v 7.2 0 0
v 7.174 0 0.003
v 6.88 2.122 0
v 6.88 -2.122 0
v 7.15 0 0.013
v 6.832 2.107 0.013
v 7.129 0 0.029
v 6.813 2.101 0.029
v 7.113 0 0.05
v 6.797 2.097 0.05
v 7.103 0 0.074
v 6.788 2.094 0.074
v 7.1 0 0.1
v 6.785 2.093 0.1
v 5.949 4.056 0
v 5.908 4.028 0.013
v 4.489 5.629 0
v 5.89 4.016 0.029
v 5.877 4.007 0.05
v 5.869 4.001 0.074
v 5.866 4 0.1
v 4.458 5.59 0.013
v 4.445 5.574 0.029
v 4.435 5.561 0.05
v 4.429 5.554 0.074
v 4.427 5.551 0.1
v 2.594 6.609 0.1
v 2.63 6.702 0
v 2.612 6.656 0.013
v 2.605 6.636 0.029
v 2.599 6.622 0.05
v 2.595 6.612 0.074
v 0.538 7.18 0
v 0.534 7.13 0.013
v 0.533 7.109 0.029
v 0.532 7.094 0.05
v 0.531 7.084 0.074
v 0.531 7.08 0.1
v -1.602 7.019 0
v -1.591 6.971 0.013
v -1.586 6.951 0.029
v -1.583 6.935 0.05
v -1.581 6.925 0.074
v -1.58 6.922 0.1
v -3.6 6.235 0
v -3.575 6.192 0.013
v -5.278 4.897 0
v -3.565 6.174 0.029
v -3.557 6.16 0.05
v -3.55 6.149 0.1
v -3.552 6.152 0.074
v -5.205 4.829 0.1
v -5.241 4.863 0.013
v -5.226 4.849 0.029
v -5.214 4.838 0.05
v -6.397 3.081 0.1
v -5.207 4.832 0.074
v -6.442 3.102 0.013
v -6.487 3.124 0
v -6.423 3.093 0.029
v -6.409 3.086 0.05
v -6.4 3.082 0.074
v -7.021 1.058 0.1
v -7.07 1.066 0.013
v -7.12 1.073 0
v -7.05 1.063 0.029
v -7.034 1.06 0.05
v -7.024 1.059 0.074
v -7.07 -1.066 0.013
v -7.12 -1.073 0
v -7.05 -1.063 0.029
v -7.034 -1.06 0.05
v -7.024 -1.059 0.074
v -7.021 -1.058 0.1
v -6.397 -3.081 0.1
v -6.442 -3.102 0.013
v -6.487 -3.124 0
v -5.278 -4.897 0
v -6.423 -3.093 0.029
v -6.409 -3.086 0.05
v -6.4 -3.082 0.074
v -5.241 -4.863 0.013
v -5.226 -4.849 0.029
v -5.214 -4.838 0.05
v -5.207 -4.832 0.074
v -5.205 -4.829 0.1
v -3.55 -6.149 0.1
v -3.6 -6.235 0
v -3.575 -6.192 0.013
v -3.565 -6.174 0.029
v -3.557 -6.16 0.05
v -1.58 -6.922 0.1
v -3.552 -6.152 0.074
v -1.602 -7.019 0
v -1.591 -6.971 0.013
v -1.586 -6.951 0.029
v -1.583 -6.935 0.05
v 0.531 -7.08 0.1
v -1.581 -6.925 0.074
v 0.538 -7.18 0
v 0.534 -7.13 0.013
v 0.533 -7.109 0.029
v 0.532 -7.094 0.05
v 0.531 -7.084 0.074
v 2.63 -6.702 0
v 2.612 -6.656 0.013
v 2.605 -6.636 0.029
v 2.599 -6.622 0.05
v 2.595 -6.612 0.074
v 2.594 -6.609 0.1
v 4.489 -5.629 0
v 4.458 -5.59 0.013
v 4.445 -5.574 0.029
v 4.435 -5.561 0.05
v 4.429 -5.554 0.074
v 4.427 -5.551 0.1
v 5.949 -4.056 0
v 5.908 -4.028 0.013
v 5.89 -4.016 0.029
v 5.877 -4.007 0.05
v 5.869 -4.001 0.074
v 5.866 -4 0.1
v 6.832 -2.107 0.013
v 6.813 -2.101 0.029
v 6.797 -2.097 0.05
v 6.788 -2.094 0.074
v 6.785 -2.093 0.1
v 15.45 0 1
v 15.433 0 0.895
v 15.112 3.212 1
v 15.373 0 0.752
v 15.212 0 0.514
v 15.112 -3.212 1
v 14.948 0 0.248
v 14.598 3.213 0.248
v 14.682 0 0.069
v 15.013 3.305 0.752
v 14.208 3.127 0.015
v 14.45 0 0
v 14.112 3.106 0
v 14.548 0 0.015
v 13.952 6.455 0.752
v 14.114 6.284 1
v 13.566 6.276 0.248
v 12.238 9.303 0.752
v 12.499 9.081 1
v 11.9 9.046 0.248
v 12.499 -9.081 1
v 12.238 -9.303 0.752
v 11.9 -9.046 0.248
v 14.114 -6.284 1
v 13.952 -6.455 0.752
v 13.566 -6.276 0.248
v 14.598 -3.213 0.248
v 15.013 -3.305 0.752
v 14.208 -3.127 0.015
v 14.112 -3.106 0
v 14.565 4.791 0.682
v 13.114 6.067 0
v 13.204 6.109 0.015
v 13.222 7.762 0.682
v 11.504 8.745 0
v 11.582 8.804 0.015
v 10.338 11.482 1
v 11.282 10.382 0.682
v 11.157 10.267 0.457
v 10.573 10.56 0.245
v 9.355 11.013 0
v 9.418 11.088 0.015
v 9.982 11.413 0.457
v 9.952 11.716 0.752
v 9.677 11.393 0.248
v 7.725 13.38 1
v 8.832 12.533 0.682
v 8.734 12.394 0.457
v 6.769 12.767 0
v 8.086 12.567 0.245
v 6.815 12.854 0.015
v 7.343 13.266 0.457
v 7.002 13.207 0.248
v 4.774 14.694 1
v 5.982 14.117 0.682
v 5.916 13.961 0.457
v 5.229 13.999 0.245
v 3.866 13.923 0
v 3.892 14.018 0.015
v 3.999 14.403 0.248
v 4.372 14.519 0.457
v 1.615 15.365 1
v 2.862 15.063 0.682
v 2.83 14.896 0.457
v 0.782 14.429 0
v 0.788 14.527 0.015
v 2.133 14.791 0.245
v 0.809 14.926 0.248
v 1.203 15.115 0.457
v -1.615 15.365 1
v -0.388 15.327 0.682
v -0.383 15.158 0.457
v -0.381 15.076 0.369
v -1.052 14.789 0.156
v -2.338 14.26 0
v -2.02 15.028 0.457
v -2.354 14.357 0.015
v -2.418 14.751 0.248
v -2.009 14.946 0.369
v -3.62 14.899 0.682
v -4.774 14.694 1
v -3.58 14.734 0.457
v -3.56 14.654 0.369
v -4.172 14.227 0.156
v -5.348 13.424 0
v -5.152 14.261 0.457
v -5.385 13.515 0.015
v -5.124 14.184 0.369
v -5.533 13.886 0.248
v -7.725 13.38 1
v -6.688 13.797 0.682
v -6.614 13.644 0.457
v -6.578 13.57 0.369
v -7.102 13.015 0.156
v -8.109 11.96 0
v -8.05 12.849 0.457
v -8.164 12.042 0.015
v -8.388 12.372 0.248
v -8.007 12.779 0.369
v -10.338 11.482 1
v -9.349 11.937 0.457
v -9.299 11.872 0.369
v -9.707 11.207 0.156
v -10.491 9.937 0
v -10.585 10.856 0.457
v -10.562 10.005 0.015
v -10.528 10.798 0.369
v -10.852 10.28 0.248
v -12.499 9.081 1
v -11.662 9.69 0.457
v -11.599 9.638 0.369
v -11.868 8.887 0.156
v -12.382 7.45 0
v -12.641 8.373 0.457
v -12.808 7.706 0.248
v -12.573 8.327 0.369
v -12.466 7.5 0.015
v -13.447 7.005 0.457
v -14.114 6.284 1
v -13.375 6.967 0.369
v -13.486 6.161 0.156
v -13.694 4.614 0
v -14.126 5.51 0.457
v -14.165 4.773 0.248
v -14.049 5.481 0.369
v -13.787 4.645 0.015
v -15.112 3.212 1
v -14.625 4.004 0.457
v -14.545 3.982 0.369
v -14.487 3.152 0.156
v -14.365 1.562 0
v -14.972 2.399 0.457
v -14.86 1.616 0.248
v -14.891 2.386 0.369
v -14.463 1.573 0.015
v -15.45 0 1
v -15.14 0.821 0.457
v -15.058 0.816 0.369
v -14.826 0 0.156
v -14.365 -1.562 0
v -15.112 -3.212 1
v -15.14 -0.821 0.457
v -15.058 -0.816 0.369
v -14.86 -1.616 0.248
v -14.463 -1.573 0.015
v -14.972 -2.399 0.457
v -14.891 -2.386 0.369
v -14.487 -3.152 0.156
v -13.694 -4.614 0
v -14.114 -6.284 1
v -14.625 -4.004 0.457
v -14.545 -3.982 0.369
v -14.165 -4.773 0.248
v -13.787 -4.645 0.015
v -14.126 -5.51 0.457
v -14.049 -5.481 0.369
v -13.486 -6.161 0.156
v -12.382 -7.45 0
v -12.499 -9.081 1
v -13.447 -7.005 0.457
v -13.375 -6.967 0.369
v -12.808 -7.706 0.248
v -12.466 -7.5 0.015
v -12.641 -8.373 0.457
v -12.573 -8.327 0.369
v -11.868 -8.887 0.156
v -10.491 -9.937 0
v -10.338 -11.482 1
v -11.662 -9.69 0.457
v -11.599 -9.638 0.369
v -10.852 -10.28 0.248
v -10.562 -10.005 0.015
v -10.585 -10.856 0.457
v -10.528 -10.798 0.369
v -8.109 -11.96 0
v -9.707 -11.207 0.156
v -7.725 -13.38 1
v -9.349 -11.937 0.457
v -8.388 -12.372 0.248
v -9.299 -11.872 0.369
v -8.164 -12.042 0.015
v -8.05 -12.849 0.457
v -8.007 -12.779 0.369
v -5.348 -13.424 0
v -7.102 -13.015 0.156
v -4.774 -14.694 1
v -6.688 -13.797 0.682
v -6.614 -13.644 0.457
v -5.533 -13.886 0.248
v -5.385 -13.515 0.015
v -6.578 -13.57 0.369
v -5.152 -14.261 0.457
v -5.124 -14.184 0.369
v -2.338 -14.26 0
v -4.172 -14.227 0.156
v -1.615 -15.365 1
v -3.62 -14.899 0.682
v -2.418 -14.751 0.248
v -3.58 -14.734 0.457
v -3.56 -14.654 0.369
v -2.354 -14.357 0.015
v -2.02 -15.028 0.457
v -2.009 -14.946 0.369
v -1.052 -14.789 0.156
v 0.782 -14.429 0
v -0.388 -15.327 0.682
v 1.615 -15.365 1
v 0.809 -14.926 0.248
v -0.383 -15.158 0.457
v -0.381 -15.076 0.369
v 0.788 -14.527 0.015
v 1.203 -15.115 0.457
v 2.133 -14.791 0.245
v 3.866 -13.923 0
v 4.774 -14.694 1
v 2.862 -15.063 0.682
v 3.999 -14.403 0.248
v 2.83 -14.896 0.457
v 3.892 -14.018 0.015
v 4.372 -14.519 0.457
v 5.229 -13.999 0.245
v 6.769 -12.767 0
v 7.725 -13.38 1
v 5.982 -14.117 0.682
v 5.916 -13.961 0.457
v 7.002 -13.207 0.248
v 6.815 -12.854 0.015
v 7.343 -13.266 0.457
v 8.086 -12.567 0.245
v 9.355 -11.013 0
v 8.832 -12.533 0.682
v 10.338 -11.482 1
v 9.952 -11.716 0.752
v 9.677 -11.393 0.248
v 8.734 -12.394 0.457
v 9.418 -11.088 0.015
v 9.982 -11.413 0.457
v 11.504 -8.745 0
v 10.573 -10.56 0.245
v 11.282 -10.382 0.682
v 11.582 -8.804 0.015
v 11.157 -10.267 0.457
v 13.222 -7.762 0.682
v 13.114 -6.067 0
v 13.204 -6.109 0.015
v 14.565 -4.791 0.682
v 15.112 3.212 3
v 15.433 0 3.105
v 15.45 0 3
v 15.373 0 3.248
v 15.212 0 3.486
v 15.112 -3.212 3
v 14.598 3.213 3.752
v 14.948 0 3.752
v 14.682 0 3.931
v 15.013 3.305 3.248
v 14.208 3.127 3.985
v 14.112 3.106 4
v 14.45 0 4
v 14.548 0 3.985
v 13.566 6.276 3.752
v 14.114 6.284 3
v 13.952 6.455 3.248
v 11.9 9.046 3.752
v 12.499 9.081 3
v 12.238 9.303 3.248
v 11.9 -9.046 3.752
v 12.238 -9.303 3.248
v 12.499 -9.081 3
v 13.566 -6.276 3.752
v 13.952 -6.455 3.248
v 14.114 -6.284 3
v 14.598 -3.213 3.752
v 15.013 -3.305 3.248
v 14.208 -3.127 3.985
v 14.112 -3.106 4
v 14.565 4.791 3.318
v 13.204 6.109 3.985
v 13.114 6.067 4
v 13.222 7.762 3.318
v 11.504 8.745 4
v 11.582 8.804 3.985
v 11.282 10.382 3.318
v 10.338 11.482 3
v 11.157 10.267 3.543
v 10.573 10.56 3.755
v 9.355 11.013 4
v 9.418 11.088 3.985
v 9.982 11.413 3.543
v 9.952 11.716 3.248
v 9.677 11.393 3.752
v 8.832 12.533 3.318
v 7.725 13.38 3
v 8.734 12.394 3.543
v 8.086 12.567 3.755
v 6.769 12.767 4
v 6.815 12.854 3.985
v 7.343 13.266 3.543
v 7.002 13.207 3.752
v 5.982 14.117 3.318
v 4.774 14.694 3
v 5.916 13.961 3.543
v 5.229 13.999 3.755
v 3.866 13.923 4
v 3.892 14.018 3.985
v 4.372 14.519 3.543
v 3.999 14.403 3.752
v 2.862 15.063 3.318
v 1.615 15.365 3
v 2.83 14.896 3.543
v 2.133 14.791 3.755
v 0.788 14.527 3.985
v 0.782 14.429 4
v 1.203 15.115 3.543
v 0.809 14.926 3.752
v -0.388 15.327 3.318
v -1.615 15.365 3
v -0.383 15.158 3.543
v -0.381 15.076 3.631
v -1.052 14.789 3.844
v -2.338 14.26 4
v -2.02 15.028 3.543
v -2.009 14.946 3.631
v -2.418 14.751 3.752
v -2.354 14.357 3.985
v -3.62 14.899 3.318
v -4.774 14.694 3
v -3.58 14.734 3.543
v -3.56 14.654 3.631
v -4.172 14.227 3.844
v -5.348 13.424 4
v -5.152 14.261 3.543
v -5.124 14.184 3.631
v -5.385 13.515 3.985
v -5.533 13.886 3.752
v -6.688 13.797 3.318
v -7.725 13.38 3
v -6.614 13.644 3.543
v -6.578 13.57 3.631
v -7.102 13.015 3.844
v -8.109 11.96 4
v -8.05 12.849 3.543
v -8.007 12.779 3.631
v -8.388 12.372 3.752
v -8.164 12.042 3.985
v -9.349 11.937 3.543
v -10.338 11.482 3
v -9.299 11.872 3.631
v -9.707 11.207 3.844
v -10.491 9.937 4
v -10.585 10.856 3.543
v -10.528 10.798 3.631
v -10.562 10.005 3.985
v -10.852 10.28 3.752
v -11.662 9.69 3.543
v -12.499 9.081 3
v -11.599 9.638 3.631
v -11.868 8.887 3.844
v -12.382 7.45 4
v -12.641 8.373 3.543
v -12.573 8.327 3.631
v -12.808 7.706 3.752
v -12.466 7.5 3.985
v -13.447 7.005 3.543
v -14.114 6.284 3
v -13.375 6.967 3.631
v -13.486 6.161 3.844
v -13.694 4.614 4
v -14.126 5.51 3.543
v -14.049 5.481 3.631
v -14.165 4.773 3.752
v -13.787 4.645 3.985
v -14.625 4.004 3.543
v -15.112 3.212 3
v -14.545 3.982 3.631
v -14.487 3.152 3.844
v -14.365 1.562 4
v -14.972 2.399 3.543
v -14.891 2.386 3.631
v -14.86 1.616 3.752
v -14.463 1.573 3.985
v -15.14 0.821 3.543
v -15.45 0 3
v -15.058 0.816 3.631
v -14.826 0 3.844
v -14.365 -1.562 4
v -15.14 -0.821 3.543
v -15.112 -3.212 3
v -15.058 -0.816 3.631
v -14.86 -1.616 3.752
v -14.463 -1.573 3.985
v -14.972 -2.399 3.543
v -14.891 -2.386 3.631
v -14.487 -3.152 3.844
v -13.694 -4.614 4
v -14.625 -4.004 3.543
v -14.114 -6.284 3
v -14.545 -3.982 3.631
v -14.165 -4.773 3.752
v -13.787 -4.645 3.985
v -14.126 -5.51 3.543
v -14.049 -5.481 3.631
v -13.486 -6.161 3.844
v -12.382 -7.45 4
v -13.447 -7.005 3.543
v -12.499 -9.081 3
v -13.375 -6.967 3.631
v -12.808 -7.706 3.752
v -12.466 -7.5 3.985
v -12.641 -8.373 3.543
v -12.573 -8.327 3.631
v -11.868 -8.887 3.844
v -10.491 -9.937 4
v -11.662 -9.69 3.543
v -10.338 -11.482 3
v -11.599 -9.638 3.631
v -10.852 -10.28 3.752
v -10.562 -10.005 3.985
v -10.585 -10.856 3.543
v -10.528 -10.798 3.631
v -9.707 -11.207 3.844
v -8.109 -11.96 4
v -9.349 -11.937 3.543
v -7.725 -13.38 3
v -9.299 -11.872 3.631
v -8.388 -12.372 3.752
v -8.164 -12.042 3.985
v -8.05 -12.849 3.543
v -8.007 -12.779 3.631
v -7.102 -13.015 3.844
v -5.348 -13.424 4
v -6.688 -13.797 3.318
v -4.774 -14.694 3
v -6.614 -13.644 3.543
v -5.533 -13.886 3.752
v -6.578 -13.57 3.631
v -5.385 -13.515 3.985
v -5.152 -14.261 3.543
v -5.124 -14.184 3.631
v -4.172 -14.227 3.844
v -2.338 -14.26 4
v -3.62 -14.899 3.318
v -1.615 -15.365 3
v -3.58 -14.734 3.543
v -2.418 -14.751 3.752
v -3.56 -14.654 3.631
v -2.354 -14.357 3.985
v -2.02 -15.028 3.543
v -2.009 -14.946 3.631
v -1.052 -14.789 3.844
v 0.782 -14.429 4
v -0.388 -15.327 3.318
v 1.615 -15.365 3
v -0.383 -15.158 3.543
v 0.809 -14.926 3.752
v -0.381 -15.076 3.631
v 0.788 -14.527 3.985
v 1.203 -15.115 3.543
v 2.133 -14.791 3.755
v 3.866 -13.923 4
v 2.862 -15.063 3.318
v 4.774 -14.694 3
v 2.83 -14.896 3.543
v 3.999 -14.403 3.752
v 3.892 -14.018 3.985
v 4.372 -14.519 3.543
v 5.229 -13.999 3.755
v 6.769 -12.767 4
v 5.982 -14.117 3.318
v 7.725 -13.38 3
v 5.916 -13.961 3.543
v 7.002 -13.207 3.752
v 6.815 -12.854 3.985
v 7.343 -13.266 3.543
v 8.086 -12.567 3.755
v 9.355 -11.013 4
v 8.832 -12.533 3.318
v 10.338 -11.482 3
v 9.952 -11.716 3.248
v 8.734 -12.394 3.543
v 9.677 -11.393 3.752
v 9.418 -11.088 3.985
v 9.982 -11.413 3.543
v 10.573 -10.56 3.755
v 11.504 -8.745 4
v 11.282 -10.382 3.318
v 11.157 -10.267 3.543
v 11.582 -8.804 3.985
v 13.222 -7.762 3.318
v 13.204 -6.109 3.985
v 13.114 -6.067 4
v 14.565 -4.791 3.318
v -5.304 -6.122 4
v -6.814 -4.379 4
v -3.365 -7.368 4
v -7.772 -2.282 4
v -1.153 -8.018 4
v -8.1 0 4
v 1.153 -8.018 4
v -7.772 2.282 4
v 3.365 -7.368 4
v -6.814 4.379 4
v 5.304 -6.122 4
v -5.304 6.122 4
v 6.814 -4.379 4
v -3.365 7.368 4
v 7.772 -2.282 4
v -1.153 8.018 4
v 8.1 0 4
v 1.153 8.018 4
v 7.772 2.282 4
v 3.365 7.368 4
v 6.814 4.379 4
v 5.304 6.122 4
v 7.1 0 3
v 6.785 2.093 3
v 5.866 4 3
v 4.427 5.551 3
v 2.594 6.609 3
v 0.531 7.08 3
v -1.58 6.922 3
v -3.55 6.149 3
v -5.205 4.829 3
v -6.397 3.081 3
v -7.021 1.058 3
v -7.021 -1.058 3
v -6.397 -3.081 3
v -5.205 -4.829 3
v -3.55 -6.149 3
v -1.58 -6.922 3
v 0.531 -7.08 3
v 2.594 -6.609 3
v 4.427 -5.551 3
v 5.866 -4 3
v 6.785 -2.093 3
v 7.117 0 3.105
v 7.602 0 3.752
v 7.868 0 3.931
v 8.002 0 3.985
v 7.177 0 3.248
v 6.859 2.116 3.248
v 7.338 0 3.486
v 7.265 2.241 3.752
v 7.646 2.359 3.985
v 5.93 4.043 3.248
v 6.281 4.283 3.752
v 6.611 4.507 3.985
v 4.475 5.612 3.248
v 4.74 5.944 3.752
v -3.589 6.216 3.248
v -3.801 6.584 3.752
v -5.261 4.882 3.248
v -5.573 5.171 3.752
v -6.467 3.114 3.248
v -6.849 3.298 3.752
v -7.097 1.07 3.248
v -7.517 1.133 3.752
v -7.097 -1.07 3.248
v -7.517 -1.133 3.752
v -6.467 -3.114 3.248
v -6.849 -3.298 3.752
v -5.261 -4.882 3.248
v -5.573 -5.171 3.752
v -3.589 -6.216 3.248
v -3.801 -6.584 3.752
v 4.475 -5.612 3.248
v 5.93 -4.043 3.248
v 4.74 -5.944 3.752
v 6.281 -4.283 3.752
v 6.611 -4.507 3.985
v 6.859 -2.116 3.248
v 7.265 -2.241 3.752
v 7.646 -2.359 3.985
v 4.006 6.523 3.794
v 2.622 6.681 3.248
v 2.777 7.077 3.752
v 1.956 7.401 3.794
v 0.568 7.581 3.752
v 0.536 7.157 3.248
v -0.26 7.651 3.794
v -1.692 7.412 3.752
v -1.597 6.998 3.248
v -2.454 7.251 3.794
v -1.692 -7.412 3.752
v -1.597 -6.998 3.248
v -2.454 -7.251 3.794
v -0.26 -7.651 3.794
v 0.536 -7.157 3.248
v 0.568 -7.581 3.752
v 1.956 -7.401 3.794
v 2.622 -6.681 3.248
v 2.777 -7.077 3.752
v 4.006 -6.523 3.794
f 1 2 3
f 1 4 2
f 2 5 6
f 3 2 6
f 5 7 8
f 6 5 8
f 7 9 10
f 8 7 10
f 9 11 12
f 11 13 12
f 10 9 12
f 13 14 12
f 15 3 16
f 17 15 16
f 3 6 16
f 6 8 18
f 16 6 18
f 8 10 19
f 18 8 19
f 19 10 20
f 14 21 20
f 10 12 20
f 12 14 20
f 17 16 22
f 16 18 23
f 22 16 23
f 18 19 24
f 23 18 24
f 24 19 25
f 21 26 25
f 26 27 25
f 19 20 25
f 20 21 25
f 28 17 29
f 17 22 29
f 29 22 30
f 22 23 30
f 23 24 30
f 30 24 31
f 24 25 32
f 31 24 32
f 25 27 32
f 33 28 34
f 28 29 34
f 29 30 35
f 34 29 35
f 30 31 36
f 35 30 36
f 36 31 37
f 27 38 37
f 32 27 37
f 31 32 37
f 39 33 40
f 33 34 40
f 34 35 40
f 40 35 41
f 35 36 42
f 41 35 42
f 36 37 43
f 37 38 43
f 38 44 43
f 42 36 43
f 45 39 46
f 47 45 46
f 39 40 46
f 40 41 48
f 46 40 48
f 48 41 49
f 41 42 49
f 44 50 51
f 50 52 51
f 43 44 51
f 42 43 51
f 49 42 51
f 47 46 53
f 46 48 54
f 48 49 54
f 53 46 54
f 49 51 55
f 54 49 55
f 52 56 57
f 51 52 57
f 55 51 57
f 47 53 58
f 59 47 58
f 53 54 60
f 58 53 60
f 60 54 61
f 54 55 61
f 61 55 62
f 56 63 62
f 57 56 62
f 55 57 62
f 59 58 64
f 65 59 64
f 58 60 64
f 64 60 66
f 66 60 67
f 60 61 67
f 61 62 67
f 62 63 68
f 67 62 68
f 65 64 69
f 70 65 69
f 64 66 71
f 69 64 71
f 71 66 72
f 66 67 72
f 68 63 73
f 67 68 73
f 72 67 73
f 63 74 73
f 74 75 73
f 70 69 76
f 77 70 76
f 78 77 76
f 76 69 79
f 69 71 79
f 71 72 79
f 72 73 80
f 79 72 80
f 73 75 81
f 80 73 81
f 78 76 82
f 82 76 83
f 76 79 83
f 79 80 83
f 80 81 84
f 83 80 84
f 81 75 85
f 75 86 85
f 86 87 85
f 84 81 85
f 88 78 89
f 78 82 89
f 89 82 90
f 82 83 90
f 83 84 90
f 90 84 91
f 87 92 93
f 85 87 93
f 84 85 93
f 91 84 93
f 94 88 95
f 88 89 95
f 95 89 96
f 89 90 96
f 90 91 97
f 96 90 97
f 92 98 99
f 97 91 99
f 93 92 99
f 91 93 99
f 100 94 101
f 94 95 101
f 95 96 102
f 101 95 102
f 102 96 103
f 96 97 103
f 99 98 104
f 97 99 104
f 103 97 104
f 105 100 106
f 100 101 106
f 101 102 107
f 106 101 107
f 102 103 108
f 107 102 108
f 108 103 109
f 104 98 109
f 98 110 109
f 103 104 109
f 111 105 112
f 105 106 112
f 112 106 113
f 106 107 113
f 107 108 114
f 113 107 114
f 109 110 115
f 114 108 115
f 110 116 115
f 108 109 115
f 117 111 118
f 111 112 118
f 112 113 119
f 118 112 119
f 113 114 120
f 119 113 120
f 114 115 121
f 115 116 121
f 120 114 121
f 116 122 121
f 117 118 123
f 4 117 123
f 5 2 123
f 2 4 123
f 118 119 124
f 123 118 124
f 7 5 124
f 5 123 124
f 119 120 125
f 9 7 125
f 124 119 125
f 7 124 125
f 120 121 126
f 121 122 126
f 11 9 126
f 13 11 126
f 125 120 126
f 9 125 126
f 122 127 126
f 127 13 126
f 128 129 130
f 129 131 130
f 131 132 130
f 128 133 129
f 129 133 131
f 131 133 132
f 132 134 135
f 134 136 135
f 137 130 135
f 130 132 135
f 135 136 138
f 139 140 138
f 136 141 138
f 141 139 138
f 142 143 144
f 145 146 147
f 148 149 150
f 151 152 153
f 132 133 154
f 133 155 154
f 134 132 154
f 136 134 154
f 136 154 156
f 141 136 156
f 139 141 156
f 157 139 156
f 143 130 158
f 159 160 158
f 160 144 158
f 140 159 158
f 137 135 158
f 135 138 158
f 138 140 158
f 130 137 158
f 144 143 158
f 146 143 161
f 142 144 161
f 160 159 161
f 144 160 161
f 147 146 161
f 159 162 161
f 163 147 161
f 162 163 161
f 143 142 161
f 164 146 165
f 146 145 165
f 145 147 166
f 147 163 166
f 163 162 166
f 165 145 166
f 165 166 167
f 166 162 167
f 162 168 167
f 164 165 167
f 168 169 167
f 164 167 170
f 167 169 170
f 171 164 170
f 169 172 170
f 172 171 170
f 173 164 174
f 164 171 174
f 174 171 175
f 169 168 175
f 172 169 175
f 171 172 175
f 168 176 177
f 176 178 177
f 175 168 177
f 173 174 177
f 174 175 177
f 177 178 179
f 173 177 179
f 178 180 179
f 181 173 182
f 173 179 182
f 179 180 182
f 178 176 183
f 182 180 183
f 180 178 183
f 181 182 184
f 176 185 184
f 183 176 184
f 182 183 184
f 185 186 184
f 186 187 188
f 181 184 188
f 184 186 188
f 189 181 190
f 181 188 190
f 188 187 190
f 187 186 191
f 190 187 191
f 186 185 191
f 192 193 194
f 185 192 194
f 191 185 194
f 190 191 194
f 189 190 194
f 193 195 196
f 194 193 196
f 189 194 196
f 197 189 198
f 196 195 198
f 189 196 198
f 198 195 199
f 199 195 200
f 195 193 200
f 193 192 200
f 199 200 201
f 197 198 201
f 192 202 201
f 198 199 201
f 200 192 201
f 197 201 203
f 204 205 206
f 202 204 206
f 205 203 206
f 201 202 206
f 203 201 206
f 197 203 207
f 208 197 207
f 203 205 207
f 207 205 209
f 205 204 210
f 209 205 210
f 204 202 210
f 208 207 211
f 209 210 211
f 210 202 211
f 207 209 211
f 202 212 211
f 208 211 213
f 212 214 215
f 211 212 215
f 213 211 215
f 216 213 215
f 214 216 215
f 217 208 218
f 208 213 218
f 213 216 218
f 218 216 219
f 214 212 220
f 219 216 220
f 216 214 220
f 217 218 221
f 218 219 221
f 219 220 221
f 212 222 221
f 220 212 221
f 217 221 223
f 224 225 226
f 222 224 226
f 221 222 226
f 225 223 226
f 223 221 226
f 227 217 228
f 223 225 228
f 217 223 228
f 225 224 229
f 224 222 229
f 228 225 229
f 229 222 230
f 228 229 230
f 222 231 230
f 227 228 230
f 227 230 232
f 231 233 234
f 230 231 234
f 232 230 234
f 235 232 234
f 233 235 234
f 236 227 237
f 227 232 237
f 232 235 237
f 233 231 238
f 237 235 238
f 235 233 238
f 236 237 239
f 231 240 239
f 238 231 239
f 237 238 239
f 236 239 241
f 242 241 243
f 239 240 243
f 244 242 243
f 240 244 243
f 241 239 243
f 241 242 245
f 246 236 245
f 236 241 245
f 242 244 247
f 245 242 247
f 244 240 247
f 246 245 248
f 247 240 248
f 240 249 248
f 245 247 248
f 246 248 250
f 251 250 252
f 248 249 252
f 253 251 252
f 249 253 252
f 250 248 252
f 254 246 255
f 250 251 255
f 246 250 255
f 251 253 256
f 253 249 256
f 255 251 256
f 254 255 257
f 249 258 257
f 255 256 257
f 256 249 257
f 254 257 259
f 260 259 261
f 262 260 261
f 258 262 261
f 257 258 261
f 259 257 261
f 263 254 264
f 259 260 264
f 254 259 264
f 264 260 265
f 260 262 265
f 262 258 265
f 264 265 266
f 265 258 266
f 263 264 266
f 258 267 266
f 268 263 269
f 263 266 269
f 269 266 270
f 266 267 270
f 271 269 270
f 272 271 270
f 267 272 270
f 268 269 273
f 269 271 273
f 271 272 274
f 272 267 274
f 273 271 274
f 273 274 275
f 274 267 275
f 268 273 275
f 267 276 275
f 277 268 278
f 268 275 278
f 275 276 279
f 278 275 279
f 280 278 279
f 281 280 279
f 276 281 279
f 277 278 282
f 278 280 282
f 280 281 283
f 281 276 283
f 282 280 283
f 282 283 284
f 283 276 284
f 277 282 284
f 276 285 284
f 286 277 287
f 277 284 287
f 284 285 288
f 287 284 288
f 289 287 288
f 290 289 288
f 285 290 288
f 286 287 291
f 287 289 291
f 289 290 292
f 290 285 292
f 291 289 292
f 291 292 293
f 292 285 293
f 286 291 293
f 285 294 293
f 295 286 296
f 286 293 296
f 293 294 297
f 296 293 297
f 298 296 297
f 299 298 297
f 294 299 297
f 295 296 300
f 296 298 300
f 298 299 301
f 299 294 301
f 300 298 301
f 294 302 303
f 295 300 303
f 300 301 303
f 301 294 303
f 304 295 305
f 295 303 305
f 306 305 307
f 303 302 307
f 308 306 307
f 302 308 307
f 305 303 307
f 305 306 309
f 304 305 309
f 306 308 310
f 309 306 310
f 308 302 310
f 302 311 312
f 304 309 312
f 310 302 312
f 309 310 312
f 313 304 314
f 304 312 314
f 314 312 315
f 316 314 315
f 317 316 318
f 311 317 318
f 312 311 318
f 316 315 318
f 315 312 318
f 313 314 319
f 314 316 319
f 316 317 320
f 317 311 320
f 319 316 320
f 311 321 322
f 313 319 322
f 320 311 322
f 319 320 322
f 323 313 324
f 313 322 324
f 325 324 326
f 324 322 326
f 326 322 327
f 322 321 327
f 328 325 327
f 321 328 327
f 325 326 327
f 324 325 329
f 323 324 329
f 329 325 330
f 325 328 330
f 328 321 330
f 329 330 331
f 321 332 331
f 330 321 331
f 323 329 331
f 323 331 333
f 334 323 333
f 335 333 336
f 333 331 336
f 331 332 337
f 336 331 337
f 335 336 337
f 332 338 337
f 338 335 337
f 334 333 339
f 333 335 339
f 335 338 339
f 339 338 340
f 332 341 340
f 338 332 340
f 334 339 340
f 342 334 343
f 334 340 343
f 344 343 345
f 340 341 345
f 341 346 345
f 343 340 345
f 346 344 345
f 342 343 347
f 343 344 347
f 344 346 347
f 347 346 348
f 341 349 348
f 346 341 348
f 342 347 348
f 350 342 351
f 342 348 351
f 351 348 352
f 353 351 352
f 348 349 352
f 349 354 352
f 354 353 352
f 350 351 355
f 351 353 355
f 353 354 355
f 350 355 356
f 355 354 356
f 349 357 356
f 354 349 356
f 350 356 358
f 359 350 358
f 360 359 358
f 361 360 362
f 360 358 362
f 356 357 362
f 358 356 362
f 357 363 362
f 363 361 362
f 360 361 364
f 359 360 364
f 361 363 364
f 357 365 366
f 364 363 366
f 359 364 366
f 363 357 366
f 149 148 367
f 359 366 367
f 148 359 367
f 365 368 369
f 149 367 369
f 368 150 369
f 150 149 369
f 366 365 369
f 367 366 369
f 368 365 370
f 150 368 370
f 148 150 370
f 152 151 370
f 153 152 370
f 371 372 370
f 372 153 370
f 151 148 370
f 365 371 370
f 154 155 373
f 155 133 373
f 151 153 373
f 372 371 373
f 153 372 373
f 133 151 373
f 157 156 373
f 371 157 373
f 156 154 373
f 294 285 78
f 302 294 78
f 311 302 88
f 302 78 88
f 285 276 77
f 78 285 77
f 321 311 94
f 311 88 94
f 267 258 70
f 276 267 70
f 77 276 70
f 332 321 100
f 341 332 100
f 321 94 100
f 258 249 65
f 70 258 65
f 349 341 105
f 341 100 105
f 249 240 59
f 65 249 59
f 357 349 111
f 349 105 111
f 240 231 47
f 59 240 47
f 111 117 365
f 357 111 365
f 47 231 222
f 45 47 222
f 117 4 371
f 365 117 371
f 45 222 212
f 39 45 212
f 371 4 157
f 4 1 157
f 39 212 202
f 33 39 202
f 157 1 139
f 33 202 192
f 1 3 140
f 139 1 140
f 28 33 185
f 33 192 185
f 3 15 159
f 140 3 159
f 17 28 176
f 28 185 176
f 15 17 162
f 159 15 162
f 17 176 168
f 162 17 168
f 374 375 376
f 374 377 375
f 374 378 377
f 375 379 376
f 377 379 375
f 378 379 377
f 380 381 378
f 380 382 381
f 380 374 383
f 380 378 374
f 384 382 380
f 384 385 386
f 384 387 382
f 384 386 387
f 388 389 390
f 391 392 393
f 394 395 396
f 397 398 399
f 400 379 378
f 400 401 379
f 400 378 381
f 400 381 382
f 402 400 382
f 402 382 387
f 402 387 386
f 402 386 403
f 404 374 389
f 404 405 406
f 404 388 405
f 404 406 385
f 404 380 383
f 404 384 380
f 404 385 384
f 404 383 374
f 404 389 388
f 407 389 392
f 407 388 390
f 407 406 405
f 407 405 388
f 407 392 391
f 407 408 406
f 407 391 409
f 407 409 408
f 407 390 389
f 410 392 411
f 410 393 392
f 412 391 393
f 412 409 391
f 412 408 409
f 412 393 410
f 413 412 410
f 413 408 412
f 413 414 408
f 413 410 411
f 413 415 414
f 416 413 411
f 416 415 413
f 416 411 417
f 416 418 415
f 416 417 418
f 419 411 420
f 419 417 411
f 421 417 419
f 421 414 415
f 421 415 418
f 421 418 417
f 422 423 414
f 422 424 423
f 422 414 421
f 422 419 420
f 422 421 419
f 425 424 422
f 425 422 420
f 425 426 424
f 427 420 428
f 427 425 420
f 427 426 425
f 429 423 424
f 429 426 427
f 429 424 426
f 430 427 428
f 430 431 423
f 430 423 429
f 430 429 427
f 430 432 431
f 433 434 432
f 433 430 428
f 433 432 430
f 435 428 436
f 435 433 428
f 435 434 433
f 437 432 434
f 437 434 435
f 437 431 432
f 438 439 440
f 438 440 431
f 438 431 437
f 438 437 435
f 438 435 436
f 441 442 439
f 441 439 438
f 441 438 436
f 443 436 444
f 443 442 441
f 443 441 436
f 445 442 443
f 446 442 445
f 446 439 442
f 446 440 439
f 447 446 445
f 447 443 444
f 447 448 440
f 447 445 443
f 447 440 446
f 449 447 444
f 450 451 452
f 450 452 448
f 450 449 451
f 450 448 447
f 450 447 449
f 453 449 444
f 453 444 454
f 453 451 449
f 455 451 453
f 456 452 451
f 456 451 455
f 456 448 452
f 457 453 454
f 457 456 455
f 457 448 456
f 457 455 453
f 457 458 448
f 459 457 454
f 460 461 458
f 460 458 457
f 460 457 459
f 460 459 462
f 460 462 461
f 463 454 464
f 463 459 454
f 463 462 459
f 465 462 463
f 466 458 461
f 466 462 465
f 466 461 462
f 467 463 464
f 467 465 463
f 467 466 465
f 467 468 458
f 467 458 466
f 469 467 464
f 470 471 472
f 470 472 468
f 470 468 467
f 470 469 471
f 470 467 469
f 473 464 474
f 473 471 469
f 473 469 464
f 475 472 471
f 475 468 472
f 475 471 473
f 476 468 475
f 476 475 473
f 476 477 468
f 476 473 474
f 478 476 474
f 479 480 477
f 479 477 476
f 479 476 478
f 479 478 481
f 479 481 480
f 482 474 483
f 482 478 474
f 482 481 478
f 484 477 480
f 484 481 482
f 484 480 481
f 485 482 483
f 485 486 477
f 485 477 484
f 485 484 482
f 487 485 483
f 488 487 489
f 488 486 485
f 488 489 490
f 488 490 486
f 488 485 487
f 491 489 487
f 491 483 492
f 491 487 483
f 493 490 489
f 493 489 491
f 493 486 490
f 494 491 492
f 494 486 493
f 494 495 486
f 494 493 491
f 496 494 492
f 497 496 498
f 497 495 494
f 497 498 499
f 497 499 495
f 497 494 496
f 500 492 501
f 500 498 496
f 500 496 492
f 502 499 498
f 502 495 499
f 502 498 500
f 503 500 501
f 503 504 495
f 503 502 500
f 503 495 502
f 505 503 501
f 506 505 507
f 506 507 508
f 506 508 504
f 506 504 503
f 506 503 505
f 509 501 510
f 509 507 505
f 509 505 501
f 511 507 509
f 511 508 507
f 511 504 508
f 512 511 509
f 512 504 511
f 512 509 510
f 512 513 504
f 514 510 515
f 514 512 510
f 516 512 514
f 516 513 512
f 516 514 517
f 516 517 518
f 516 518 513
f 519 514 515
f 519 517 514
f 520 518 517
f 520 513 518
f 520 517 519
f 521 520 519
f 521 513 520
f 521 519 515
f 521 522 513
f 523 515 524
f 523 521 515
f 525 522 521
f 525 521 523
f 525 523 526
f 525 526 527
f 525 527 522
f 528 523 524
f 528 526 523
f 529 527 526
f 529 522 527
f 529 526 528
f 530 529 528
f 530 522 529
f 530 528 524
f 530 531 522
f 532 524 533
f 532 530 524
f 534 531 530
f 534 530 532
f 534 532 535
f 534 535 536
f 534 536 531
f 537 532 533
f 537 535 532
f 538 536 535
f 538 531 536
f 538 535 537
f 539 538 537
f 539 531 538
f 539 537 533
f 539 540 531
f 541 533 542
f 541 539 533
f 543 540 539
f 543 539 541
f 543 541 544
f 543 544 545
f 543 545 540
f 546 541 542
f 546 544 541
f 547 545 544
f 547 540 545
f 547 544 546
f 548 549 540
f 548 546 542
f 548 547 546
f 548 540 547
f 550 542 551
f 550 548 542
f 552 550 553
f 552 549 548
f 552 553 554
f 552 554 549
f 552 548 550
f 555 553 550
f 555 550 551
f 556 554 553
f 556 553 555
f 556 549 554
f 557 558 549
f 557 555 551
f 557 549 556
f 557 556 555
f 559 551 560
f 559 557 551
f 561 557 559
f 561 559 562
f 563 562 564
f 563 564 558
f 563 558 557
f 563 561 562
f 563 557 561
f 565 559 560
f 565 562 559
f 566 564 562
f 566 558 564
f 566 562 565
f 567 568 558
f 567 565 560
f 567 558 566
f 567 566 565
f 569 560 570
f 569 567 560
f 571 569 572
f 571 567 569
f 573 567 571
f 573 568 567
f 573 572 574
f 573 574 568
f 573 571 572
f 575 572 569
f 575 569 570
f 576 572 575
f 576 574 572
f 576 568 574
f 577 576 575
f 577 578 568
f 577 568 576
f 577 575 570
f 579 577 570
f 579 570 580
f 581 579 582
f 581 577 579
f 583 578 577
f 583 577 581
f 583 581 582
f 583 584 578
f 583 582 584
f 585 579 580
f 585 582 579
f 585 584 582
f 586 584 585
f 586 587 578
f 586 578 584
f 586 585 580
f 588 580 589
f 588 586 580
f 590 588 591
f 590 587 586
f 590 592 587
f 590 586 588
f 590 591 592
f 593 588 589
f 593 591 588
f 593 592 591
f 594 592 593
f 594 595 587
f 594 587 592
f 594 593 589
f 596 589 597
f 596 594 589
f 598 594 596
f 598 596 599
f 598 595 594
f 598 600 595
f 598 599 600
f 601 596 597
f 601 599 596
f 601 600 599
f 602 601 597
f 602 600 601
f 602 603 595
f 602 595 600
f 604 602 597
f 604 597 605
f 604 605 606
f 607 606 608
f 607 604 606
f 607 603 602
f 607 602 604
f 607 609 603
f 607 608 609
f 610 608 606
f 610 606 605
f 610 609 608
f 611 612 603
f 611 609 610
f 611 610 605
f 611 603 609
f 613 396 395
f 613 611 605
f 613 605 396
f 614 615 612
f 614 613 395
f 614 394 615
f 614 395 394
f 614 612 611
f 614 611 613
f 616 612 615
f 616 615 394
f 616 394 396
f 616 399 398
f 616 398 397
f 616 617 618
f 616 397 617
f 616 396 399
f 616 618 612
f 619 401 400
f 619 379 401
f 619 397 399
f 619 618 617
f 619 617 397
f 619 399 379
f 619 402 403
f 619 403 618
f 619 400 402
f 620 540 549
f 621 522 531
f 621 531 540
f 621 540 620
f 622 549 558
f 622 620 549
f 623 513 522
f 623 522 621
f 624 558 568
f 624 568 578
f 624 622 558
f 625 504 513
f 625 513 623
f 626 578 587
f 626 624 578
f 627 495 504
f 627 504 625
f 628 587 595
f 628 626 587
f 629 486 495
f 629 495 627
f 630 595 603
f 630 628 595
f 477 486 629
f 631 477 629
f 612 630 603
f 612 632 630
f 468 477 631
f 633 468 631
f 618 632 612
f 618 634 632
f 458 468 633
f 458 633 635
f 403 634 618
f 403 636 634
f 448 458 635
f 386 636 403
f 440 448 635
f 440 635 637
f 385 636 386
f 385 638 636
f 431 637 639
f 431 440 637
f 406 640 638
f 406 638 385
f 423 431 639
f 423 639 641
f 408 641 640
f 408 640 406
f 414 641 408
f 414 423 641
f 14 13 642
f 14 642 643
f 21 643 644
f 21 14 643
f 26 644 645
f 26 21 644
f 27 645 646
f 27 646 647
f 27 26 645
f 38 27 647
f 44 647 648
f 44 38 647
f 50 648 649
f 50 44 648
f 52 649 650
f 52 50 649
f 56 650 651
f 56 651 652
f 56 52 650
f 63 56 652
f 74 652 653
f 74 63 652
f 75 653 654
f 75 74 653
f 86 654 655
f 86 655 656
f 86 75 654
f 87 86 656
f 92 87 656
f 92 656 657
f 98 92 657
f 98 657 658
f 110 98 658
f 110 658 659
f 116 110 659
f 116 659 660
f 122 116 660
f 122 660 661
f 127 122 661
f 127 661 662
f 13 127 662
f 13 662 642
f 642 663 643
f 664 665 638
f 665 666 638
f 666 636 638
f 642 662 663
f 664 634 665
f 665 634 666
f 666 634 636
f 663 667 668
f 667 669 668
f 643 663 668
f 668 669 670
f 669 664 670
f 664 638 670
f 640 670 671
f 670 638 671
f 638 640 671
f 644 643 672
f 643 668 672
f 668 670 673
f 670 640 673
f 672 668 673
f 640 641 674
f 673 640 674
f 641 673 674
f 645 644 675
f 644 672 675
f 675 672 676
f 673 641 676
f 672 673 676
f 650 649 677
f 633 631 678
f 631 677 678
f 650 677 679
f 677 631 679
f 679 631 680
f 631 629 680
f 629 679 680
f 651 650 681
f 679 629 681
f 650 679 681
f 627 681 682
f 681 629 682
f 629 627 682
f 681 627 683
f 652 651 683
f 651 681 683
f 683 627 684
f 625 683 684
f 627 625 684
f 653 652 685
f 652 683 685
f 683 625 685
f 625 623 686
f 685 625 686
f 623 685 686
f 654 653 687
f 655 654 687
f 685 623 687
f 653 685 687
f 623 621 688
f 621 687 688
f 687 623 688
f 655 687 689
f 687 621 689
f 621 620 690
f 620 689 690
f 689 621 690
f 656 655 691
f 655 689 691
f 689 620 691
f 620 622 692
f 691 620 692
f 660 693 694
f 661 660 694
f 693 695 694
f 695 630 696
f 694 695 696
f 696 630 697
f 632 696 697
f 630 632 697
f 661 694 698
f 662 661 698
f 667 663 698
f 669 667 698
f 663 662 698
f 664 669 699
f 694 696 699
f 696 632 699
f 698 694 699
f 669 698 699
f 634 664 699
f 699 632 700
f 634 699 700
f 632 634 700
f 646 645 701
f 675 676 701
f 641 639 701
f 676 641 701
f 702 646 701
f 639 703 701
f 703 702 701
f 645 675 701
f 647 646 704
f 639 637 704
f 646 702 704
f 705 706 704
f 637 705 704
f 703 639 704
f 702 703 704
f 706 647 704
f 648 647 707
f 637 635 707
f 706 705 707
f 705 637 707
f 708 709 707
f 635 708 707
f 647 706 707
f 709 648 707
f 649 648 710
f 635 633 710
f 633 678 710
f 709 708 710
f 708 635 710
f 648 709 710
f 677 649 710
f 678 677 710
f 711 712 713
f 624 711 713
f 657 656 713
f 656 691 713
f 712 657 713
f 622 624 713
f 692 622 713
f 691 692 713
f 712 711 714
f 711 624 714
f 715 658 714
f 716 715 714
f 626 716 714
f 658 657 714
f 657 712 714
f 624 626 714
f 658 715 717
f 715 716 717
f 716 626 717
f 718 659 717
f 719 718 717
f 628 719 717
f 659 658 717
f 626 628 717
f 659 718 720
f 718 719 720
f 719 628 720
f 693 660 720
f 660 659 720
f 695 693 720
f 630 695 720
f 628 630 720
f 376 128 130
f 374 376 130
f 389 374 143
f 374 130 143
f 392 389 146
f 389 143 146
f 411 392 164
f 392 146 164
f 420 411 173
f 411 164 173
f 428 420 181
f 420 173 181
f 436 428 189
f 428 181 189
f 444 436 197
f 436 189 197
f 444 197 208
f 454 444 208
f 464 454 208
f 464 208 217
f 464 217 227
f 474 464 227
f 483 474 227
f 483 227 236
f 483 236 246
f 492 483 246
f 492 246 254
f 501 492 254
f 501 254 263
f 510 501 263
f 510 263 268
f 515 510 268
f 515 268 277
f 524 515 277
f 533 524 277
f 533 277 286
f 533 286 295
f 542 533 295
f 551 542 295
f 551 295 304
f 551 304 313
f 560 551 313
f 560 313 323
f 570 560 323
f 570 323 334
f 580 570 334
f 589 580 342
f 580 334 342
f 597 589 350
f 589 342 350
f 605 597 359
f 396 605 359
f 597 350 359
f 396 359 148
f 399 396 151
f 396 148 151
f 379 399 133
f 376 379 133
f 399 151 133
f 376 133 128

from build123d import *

# Parameters (mm, degrees)
CROQUIS2_R              = 15.45
CROQUIS2_R_2            = 7.1
SALIENTE_EXTRUIR1_DEPTH = 4
REDONDEO1_SIZE          = 1
REDONDEO2_R             = 0.1


with BuildPart() as part:
    # Croquis2 → Saliente-Extruir1 (new body)
    with BuildSketch(Plane(origin=(0, 0, 0), x_dir=(0, 1, 0), z_dir=(0, 0, 1))):
        with Locations(Location((0, 0, 0), (0, 0, 270))):
            Circle(CROQUIS2_R)
        with Locations(Location((0, 0, 0), (0, 0, 270))):
            Circle(CROQUIS2_R_2, mode=Mode.SUBTRACT)
    extrude(amount=SALIENTE_EXTRUIR1_DEPTH)

    # Redondeo1
    # a fillet whose section is not a circle: 1 mm, written as the material it takes off along each edge
    with BuildSketch(Plane(origin=(0, 0, 0), x_dir=(1, 0, 0), z_dir=(0, -1, 0))) as redondeo1_piece_1:
        with BuildLine():
            Bezier((15.45, REDONDEO1_SIZE), (15.45, 0), (15.45 - REDONDEO1_SIZE, 0), weights=[1, 0.353553391, 1])
            Line((15.45 - REDONDEO1_SIZE, 0), (15.45, 0))
            Line((15.45, 0), (15.45, REDONDEO1_SIZE))
        make_face()
    revolve(axis=Axis((0, 0, 0), (0, 0, 1)), mode=Mode.SUBTRACT)
    with BuildSketch(Plane(origin=(0, 0, 4), x_dir=(1, 0, 0), z_dir=(0, -1, 0))) as redondeo1_piece_2:
        with BuildLine():
            Bezier((15.45, -REDONDEO1_SIZE), (15.45, 0), (15.45 - REDONDEO1_SIZE, 0), weights=[1, 0.353553391, 1])
            Line((15.45 - REDONDEO1_SIZE, 0), (15.45, 0))
            Line((15.45, 0), (15.45, -REDONDEO1_SIZE))
        make_face()
    revolve(axis=Axis((0, 0, 4), (0, 0, 1)), mode=Mode.SUBTRACT)
    with BuildSketch(Plane(origin=(0, 0, 4), x_dir=(1, 0, 0), z_dir=(0, -1, 0))) as redondeo1_piece_3:
        with BuildLine():
            Bezier((7.1, -REDONDEO1_SIZE), (7.1, 0), (7.1 + REDONDEO1_SIZE, 0), weights=[1, 0.353553391, 1])
            Line((7.1 + REDONDEO1_SIZE, 0), (7.1, 0))
            Line((7.1, 0), (7.1, -REDONDEO1_SIZE))
        make_face()
    revolve(axis=Axis((0, 0, 4), (0, 0, 1)), mode=Mode.SUBTRACT)

    # Redondeo2
    redondeo2_edges = [part.edges().sort_by_distance(p)[0] for p in [
        (-7.1, 0, 0),
    ]]
    fillet(redondeo2_edges, radius=REDONDEO2_R)


solid = part.part
